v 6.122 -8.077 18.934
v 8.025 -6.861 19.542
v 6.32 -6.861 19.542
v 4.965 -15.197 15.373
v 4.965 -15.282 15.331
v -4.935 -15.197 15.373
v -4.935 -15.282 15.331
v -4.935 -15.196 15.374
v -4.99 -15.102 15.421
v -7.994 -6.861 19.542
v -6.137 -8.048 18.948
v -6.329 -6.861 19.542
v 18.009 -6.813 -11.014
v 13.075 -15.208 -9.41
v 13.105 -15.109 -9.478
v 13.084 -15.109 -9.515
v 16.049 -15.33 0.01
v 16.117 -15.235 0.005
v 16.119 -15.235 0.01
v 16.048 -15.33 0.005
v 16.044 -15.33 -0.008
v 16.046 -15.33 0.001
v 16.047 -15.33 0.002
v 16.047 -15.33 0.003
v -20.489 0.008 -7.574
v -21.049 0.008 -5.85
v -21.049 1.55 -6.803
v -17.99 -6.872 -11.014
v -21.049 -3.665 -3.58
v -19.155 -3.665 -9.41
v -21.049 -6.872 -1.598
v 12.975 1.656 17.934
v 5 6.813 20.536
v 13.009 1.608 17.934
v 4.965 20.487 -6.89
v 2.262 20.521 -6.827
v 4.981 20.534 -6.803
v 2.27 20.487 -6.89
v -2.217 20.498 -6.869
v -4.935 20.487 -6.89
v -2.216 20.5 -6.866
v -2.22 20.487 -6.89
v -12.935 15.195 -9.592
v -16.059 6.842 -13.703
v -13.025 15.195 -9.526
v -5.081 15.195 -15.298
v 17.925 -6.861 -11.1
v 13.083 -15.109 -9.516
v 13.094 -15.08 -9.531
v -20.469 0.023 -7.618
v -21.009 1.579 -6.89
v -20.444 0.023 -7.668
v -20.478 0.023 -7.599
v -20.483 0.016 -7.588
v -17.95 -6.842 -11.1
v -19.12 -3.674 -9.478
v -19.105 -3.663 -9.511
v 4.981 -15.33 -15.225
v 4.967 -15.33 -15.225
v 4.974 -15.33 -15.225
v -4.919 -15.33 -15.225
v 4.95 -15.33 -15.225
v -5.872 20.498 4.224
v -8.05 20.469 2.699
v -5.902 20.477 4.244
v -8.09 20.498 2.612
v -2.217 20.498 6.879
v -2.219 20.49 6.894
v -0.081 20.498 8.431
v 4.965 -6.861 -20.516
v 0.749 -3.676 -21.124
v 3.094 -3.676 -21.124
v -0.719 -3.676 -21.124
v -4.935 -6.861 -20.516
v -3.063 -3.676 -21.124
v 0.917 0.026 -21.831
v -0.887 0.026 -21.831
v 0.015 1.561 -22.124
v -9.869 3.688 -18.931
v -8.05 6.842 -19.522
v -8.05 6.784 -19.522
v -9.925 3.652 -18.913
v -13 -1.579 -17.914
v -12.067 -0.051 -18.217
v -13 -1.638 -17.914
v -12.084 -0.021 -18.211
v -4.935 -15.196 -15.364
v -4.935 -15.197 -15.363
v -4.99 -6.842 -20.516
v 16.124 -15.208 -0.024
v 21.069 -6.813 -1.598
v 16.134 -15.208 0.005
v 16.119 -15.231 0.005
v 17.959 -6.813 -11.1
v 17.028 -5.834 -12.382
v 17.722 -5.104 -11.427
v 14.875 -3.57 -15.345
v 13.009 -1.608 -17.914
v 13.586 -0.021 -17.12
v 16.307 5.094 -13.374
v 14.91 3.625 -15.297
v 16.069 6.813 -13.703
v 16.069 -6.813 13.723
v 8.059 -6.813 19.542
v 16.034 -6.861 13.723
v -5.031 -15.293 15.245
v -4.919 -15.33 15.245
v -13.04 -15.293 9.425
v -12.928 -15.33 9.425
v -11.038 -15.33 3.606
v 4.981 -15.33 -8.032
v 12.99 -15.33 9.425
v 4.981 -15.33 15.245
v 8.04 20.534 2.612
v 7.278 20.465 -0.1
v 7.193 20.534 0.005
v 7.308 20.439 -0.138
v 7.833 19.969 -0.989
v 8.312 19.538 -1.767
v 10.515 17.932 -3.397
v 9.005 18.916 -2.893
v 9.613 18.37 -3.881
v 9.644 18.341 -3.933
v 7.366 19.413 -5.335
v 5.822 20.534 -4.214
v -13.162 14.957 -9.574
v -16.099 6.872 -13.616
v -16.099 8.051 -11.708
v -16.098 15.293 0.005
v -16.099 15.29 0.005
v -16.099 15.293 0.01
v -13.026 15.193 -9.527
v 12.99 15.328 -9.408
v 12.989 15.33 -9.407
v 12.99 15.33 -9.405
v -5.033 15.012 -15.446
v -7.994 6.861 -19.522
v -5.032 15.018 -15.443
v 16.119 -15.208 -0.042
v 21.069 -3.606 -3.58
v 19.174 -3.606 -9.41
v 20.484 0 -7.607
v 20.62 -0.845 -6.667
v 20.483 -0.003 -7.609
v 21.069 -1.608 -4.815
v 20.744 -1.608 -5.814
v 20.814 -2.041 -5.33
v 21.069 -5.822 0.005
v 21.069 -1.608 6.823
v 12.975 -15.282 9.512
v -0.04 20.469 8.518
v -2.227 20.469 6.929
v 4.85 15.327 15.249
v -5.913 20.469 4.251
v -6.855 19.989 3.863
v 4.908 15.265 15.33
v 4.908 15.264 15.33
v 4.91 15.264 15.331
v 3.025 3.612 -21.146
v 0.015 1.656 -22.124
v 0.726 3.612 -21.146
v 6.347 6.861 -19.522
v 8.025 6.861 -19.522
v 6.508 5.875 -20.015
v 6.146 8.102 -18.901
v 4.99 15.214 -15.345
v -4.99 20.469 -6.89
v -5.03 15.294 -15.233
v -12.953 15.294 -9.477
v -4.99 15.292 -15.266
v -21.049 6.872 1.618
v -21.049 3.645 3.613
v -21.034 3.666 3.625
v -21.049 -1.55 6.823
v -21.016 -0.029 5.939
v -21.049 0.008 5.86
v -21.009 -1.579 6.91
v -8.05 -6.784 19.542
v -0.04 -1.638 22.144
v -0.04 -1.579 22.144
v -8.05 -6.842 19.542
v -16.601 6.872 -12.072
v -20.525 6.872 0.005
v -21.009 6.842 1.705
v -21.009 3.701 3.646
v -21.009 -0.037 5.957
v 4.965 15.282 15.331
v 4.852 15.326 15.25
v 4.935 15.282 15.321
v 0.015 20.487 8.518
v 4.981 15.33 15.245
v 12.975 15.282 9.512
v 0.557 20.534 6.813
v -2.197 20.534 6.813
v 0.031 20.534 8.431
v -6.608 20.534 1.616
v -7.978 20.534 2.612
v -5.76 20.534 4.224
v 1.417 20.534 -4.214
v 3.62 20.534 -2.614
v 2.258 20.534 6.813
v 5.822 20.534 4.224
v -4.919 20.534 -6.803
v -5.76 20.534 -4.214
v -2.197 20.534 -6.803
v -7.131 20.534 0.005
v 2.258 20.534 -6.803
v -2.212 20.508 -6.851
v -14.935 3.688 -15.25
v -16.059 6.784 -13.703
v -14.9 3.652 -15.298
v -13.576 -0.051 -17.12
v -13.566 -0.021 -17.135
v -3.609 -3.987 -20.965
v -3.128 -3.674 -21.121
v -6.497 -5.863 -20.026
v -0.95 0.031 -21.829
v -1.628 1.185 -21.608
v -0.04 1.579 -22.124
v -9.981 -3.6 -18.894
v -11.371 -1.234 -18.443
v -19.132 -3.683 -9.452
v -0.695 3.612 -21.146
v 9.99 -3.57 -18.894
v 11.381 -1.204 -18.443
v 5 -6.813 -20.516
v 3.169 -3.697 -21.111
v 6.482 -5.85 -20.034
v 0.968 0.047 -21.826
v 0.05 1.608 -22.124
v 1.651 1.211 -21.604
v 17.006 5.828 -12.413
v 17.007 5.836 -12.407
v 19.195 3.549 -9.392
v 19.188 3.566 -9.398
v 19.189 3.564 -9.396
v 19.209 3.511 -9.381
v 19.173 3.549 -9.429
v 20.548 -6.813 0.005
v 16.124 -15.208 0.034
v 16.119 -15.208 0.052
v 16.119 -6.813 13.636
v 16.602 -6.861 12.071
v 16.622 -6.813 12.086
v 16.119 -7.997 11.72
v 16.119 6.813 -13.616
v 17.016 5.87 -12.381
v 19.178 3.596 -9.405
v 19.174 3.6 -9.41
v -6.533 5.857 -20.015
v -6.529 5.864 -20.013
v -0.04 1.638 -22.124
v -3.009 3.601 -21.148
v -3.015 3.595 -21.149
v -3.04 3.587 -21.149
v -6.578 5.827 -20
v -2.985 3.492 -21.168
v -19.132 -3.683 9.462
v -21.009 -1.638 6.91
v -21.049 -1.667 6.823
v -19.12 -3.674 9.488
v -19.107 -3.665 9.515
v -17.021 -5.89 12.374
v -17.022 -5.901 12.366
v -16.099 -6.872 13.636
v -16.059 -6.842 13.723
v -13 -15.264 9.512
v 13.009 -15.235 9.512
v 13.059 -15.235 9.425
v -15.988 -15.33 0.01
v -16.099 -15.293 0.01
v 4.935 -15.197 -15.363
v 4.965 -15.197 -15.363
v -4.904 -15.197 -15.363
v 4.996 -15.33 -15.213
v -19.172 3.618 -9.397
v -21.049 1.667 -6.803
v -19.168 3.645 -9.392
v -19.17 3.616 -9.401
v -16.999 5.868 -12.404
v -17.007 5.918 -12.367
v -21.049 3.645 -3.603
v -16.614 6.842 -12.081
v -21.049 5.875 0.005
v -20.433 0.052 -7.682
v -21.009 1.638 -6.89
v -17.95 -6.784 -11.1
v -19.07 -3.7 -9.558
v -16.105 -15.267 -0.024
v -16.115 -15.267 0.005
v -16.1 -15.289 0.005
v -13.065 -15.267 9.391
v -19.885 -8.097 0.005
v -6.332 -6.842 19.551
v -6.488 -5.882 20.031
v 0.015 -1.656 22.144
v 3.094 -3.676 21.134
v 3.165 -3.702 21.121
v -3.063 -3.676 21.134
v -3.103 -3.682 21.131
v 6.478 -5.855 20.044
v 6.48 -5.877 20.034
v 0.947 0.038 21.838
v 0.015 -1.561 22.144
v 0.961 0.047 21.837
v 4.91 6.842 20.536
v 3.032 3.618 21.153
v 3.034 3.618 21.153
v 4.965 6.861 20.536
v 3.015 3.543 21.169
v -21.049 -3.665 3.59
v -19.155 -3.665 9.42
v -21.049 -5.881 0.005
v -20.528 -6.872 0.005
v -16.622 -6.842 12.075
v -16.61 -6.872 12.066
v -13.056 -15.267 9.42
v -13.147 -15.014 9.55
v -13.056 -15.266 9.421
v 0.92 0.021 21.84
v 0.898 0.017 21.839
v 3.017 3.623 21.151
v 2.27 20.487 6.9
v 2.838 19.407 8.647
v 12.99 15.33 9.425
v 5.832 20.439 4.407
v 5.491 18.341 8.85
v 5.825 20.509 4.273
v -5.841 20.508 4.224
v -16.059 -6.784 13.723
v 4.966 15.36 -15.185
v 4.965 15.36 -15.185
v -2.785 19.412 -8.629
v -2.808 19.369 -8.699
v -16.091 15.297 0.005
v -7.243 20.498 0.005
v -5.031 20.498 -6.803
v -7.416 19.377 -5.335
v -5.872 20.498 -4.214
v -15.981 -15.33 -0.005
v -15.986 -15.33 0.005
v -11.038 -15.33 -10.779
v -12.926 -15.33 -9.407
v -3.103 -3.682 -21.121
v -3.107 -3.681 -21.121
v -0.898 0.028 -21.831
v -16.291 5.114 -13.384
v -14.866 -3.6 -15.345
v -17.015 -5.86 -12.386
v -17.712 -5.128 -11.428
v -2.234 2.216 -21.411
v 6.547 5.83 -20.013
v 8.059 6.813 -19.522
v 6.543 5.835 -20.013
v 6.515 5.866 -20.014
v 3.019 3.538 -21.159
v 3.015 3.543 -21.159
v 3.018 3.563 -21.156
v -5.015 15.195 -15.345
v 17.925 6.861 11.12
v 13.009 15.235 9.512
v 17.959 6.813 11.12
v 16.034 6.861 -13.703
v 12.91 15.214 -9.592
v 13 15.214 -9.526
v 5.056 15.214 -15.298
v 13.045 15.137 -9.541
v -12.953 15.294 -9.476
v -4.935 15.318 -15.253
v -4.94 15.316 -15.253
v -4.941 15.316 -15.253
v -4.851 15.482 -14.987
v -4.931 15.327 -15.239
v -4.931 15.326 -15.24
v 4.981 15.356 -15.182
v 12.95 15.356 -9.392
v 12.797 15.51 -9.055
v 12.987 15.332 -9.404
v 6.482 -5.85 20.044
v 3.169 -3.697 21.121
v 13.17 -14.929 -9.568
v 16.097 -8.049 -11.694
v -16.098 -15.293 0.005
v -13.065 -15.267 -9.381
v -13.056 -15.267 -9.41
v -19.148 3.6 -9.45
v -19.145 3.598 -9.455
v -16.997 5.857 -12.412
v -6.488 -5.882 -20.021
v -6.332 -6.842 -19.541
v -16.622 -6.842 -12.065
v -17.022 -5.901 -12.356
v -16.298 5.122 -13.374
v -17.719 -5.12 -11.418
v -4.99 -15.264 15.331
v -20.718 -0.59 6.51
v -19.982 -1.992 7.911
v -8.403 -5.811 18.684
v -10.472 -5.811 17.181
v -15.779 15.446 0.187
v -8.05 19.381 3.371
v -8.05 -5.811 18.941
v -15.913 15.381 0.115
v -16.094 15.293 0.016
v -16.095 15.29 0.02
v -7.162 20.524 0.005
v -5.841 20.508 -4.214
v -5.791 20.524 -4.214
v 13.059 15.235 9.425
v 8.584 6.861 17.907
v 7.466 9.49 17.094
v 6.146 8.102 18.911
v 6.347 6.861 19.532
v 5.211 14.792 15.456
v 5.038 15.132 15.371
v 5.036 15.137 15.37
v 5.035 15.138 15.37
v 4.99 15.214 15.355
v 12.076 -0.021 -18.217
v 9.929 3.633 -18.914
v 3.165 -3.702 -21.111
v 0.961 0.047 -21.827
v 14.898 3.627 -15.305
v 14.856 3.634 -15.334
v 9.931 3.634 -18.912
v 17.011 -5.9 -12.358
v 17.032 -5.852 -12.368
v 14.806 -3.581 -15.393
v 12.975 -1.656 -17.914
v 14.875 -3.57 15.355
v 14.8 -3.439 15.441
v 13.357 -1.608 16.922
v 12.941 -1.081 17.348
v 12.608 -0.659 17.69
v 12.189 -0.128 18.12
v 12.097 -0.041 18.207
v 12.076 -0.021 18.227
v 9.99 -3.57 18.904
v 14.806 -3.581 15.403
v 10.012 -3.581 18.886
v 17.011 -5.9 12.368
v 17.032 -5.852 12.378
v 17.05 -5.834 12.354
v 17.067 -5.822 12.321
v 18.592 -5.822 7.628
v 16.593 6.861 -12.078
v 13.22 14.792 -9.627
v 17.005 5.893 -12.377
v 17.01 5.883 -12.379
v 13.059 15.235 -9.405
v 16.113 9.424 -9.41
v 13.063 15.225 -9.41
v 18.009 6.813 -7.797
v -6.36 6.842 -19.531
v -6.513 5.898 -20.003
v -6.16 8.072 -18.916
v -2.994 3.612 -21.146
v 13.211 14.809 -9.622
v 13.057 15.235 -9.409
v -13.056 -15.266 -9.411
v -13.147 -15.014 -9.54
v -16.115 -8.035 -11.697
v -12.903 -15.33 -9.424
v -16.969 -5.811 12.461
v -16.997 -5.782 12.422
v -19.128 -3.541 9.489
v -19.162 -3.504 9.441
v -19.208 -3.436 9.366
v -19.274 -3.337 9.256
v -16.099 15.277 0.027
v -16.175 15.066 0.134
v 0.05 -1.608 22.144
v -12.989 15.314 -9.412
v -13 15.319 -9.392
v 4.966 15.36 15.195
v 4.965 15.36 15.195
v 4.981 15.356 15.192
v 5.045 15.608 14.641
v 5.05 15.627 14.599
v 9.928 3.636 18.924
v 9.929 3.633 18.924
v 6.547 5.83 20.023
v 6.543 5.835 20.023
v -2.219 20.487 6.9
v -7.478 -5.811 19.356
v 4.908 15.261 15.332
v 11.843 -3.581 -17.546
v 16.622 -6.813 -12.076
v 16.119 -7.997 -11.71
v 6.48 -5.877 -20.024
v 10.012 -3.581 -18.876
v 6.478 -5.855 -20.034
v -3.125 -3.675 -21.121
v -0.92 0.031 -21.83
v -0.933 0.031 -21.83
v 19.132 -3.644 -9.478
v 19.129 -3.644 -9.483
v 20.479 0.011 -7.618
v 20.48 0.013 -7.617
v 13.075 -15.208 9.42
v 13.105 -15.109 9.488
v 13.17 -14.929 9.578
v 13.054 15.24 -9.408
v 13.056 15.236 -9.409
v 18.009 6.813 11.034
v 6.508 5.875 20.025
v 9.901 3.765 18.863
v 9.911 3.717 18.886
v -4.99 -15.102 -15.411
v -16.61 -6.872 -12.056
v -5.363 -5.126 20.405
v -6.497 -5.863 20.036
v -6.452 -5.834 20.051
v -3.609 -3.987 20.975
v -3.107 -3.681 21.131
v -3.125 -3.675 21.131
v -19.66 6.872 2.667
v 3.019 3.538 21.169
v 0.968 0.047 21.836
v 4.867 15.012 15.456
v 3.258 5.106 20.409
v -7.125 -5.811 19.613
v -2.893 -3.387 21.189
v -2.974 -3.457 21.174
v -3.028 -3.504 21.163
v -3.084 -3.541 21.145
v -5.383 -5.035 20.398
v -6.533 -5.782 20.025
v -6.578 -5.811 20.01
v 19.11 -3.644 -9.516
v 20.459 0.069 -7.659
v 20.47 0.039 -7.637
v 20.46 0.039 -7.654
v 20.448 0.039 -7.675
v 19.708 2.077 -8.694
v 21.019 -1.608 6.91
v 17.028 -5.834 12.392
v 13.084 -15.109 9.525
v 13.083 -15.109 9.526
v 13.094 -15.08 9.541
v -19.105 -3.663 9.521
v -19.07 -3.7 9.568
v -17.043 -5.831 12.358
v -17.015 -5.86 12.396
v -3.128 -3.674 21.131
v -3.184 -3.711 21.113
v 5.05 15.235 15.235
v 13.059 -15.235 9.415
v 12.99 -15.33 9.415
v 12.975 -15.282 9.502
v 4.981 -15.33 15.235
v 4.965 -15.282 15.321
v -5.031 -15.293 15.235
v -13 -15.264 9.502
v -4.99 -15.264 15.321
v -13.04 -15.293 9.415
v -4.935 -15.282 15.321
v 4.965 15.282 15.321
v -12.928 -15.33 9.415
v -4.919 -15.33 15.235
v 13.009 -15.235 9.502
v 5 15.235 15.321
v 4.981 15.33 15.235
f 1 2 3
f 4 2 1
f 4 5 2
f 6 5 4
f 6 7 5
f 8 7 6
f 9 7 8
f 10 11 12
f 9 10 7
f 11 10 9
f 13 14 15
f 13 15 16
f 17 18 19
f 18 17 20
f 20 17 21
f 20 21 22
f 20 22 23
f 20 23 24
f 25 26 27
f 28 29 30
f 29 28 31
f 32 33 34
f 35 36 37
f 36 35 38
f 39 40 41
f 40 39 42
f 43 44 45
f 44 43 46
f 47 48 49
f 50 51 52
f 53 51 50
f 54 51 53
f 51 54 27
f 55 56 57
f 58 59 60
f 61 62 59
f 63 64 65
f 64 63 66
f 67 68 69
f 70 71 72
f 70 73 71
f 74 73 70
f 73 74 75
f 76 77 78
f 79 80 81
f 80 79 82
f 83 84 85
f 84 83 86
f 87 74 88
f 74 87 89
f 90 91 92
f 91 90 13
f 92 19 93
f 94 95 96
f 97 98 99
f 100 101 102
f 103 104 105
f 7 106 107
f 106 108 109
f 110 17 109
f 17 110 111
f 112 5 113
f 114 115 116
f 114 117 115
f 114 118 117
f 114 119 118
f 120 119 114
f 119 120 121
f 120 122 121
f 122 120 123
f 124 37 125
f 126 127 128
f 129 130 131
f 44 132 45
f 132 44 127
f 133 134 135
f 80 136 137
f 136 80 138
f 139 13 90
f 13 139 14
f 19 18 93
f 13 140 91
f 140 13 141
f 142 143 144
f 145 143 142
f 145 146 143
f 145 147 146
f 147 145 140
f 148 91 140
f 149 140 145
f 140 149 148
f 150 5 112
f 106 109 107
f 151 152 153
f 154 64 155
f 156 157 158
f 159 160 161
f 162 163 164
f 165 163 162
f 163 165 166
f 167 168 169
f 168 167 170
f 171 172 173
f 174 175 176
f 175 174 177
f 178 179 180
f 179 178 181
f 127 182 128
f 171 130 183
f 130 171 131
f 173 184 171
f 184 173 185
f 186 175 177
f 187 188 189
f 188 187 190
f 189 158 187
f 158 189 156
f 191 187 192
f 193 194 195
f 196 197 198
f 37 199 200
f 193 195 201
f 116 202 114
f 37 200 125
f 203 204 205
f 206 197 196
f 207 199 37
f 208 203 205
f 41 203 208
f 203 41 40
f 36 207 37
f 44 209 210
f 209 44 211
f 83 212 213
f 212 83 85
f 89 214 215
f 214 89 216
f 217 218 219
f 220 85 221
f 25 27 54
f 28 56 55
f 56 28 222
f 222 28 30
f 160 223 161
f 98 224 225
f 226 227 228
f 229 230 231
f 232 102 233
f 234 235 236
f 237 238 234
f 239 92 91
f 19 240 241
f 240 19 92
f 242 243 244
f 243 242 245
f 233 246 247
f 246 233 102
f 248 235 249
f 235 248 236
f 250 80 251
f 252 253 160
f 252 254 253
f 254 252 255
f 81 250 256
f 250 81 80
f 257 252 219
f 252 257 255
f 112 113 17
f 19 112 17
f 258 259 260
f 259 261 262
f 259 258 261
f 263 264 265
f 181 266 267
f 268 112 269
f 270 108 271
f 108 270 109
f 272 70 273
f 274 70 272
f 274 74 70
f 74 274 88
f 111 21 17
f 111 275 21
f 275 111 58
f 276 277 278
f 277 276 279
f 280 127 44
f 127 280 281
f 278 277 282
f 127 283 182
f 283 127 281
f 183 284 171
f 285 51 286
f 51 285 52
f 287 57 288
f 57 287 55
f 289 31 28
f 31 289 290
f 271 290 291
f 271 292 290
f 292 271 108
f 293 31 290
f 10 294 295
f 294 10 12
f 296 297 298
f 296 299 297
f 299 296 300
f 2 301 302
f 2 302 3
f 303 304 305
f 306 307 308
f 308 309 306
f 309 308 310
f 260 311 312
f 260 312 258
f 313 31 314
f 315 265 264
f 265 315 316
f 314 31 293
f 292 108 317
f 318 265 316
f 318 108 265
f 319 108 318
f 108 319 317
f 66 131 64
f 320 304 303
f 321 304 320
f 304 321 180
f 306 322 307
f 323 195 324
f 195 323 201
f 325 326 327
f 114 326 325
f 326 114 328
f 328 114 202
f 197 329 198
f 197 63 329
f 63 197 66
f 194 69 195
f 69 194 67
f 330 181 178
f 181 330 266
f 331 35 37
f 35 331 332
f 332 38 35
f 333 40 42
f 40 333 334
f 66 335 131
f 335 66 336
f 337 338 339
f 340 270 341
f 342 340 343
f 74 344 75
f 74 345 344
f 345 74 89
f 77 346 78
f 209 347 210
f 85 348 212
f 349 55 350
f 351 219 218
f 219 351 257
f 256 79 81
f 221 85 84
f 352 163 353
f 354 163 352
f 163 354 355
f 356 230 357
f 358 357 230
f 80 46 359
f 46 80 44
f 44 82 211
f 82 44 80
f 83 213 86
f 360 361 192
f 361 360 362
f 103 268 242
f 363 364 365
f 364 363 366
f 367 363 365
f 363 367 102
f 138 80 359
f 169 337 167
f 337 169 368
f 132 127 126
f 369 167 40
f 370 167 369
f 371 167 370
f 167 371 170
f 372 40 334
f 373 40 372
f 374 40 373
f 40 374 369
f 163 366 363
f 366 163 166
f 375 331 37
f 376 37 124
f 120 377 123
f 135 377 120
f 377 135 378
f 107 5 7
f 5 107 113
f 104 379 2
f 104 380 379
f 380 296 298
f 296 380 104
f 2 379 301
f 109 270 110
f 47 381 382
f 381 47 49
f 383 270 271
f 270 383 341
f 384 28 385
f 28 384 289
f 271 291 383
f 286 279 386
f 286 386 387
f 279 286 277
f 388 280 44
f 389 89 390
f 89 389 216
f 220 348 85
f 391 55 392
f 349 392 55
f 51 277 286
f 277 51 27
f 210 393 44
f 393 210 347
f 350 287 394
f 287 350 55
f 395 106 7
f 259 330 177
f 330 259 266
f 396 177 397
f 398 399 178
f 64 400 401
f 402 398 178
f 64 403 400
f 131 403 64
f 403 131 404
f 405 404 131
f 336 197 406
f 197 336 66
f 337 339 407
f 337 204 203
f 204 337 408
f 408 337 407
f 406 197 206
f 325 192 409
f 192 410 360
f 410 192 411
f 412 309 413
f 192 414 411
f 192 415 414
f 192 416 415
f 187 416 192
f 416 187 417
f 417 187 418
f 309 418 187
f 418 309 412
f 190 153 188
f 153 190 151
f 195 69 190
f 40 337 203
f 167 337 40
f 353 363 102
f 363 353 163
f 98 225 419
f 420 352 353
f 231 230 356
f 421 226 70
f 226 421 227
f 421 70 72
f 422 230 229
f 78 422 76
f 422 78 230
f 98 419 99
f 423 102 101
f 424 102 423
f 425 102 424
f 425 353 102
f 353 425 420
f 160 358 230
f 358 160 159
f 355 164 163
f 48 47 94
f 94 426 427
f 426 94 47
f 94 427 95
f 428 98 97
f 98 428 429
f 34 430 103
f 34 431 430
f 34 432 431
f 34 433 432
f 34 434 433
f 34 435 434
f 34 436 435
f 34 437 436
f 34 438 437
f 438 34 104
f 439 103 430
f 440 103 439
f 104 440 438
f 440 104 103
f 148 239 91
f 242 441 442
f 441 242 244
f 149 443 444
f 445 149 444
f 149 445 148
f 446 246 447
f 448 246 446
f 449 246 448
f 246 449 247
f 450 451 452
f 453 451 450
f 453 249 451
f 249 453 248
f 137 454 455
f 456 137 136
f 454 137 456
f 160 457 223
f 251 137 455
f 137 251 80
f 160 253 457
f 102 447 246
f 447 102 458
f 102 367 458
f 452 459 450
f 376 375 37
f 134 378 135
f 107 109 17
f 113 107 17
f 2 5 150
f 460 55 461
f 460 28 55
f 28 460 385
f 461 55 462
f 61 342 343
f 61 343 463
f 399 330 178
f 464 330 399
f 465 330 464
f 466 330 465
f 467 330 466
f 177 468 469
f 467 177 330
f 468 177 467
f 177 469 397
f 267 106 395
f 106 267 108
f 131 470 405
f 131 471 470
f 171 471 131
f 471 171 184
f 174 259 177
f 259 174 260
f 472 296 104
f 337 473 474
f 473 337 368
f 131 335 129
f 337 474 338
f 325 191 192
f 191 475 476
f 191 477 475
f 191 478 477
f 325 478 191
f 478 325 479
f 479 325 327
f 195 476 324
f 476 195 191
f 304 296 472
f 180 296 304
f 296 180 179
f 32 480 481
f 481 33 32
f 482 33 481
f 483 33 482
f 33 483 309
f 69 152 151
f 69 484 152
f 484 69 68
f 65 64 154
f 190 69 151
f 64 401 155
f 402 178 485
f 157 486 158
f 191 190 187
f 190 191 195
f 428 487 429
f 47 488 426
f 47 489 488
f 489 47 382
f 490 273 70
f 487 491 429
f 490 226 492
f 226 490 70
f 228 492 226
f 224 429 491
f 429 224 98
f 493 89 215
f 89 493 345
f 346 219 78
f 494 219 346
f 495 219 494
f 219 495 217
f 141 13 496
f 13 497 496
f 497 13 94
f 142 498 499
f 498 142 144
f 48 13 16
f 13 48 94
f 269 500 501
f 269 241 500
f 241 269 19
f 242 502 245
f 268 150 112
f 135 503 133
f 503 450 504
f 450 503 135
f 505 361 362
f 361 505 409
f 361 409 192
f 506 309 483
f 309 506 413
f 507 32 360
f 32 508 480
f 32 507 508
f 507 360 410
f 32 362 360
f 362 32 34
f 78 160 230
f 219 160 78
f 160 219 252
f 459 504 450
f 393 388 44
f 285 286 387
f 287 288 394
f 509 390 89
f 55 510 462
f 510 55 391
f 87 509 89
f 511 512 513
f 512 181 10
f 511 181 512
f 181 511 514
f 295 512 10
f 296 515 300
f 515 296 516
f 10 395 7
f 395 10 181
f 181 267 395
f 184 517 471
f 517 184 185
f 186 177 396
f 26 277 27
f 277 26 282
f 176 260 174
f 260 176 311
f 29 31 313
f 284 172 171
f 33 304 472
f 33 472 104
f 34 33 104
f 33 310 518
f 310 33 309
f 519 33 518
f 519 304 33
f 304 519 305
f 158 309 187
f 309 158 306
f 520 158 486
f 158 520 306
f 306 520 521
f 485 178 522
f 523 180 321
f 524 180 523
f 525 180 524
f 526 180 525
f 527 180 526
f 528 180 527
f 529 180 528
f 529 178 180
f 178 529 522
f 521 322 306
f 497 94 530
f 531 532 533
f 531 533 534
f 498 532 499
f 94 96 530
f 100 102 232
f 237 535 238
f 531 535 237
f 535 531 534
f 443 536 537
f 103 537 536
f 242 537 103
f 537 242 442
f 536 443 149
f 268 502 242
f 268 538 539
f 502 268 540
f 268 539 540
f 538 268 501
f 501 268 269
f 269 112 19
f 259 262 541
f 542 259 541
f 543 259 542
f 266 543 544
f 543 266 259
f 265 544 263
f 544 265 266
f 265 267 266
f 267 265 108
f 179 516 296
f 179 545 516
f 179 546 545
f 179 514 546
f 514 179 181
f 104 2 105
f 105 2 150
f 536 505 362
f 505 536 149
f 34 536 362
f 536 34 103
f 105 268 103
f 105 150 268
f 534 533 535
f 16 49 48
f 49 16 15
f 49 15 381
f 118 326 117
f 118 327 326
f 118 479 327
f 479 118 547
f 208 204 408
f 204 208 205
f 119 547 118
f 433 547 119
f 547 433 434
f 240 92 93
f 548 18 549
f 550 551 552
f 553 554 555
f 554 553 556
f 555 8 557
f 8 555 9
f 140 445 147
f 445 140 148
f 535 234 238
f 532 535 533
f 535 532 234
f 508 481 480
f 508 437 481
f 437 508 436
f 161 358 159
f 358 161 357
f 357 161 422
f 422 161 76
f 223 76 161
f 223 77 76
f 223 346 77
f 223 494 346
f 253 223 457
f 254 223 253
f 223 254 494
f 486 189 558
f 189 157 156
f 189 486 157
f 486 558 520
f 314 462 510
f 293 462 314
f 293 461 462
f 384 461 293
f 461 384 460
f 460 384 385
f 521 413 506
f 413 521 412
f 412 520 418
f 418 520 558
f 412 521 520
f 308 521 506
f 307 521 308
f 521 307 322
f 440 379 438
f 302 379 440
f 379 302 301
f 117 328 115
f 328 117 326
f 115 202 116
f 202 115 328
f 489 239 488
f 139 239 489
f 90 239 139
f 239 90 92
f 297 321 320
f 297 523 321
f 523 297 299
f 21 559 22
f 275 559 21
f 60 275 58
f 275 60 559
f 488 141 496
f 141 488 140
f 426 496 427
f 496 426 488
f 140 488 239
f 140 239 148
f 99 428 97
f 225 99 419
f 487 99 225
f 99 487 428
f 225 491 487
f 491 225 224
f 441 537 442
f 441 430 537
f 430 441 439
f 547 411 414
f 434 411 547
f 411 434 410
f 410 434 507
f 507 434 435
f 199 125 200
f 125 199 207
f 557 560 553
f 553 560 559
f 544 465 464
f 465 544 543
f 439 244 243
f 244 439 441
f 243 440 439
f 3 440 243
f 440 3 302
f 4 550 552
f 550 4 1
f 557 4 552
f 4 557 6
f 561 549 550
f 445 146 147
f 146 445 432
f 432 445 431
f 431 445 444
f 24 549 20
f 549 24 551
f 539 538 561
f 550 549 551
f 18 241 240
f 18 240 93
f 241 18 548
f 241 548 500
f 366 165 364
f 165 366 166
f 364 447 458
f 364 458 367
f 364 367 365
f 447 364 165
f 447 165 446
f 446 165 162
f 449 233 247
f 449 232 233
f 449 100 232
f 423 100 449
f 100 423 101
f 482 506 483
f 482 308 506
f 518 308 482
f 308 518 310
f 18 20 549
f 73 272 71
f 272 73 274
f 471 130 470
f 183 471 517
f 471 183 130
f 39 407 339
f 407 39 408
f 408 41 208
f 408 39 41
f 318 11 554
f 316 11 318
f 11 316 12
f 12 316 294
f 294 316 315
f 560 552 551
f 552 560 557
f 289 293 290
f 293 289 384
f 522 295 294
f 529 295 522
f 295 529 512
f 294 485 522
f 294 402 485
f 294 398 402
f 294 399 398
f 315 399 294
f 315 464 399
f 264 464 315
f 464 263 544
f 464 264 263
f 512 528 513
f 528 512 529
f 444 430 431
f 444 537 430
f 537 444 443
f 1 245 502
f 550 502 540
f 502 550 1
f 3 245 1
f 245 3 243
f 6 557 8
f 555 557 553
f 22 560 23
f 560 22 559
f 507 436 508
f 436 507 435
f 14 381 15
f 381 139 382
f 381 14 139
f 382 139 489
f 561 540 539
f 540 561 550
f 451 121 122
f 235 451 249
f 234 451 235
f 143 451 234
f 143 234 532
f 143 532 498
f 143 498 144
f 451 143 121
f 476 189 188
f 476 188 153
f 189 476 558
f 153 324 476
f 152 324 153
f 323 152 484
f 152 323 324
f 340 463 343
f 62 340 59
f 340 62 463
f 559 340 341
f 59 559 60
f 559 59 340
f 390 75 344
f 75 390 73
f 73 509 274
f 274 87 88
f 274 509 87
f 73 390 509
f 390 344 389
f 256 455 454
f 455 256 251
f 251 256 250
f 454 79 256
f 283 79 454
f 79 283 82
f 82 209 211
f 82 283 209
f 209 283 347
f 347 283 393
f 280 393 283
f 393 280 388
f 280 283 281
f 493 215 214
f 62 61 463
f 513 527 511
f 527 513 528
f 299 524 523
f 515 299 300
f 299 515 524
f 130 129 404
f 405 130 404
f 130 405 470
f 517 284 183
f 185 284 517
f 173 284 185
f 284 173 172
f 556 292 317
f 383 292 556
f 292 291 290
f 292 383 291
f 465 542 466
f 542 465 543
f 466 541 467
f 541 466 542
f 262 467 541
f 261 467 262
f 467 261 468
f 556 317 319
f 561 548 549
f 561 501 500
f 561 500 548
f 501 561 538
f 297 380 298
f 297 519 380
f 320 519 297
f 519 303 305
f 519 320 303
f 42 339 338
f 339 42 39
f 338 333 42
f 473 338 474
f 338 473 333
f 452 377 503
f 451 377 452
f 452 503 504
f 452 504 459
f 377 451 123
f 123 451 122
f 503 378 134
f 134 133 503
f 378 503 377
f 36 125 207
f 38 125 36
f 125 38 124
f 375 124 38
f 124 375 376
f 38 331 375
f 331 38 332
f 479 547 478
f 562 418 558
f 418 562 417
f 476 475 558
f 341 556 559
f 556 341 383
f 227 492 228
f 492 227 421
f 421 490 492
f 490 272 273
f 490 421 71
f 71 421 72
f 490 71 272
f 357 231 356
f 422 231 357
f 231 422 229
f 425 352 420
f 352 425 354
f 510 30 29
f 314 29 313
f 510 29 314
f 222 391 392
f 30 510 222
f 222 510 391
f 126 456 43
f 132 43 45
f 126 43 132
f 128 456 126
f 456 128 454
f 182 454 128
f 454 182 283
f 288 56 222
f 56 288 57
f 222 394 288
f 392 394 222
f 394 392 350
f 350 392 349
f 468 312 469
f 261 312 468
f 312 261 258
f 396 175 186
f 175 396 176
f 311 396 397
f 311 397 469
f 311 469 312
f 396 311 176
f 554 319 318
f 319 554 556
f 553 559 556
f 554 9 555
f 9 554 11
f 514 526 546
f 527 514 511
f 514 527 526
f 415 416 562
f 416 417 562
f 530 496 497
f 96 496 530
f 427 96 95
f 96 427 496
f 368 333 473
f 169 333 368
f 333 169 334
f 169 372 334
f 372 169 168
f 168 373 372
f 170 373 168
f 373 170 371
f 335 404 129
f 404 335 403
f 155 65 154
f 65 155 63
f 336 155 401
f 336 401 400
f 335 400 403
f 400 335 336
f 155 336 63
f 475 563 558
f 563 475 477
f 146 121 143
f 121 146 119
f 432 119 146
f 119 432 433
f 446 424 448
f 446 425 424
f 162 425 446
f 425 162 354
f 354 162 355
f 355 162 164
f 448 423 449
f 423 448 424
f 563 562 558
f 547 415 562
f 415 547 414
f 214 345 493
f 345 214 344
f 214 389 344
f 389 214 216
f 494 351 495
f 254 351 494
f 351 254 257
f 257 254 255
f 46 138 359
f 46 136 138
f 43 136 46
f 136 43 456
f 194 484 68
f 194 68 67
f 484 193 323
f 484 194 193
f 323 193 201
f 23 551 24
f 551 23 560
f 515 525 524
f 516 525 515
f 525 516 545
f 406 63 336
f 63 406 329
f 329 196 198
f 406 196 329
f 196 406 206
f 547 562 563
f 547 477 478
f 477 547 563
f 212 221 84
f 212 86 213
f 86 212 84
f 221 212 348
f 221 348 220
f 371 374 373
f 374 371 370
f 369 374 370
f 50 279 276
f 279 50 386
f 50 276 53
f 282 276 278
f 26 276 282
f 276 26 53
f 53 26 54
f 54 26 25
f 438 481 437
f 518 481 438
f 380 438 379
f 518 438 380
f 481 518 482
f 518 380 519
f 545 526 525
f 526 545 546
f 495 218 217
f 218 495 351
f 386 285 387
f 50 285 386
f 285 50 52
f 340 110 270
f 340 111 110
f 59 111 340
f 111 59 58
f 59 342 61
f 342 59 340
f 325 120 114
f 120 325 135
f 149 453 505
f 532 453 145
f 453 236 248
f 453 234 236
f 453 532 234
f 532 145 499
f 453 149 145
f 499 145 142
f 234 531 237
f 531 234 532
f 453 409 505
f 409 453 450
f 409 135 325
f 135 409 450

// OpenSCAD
// Auto-generated OpenSCAD file

    shift = 0.01;

    inner_points = 9.9*[[1.30901696039044, -1.5388417782265715, 0.9510565474746461], [-2.1180339733846583, 0.6881910044632044, -0.16245986108672694], [1.8090169796137625, -0.6881909777335578, 1.1135163775781873], [-1.6180339541613356, 1.5388418049562185, -3.0983185683730596e-08], [1.6180339541612156, -1.538841804956286, 3.0983185683730596e-08], [-1.8090169796138824, 0.68819097773349, -1.1135163775781873], [2.1180339733845384, -0.6881910044632721, 0.16245986108672694], [-1.30901696039056, 1.538841778226504, -0.9510565474746461], [-0.5000000141570125, -0.6881909060497494, 2.064572895340174], [-1.3090169968820657, -0.16245978121444532, 1.801707328858261], [5.066310430925828e-09, 0.1624598944432645, 2.227032725443715], [-0.8090169776587427, 0.6881910192785686, 1.9641671589618024], [0.809016977658623, -0.6881910192786364, -1.9641671589618024], [-5.066430170716978e-09, -0.16245989444333217, -2.227032725443715], [1.3090169968819458, 0.16245978121437765, -1.801707328858261], [0.5000000141568928, 0.6881909060496817, -2.064572895340174], [-1.618034023338573, -1.5388417322190338, 3.303893986172923e-08], [0.5000000468426242, 2.0645728837839843, 0.6881909169706076], [-1.3090170295677974, -1.538841758948748, -0.9510564834525206], [0.8090170406134, 2.06457285705427, -0.26286559952085276], [-2.118033992838755, -0.16245981482511987, -0.6881909555105802], [-0.8090169481364942, 2.064572893422896, -0.26286559849297564], [0.49999998584298705, -0.6881909285267964, 2.0645728947049107], [-1.6180339724070885, 0.6881910252357436, 1.376381907183268], [1.6180339724069686, -0.6881910252358113, -1.376381907183268], [-0.49999998584310684, 0.6881909285267287, -2.0645728947049107], [-1.3090170283594544, -1.5388417193808985, 0.9510565491377863], [0.5000000355661287, 1.5388417893601316, 1.5388417362589322], [-0.5000000355662484, -1.538841789360199, -1.5388417362589322], [1.3090170283593345, 1.538841719380831, -0.9510565491377863], [0.4999999663888912, -1.5388417478151206, 1.5388418002810578], [-2.118033984661154, 0.16245991003935126, 0.6881909582015976], [1.3090169918678283, -0.16245984006011832, 1.8017073271951207], [-1.309016959182217, 1.5388418177943537, 0.9510564851156607], [1.309016959182097, -1.5388418177944212, -0.9510564851156607], [-1.3090169918679482, 0.16245984006005065, -1.8017073271951207], [2.118033984661034, -0.16245991003941893, -0.6881909582015976], [-0.499999966389011, 1.5388417478150531, -1.5388418002810578], [-0.5000000336111086, -1.5388417253380735, 1.5388418009163205], [-1.8090170091361313, -0.6881908964108379, 1.1135163798765904], [0.8090170110911518, 0.6881909829099426, 1.9641671579339253], [-0.49999996443387096, 1.5388418118371785, 1.5388417368941951], [0.49999996443375117, -1.538841811837246, -1.5388417368941951], [-0.8090170110912714, -0.6881909829100104, -1.9641671579339253], [1.8090170091360114, 0.6881908964107701, -1.1135163798765904], [0.5000000336109889, 1.538841725338006, -1.5388418009163205], [-2.1180340041152497, -0.688190909248973, 0.16245986377774424], [-0.49999995315737555, 2.064572906261031, 0.6881909176058706], [-1.6180340050928197, -0.6881909524985592, -1.3763819051275137], [4.586505433710224e-08, 2.064572863011445, -0.8506508512993872]];

    outer_points_unshifted = 9.9*[[-0.8090170110916863, -0.6881908812857832, 1.9641671935400922], [1.3090170295679837, 1.538841709741917, -0.95105656307045], [-0.5000000355665741, -1.538841709741917, 1.5388418158770538], [1.6180340050930957, 0.6881908812857832, -1.3763819407334883], [-1.6180340050930957, -0.6881908812857832, 1.3763819407334883], [0.5000000355665741, 1.538841709741917, -1.5388418158770538], [-1.3090170295679837, -1.538841709741917, 0.95105656307045], [0.8090170110916863, 0.6881908812857832, -1.9641671935400922], [1.3090169968815815, 0.1624598744330541, 1.8017073204530507], [1.809017009135817, 0.6881909540230795, 1.113516344270661], [1.6180339724066932, -0.6881909540230795, 1.3763819427900126], [2.118033984660929, -0.1624598744330541, 0.6881909666076228], [-2.118033984660929, 0.1624598744330541, -0.6881909666076228], [-1.6180339724066932, 0.6881909540230795, -1.3763819427900126], [-1.809017009135817, -0.6881909540230795, -1.113516344270661], [-1.3090169968815815, -0.1624598744330541, -1.8017073204530507], [4.5864941067286225e-08, 2.06457290702336, 0.8506507444803071], [1.309016960390704, -1.5388418274333344, -0.9510564678560931], [-0.8090169481364684, 2.06457290702336, 0.26286549167370316], [0.4999999663892946, -1.5388418274333344, -1.538841720662697], [0.5000000468428755, 2.064572848177651, -0.6881910237895683], [1.3090169918683128, -0.16245993327876307, -1.8017073187892874], [0.8090169776582082, -0.6881909176544313, 1.9641671945683543], [2.118034004115161, 0.6881909176544313, 0.1624598281718883], [-2.118034004115161, -0.6881909176544313, -0.1624598281718883], [-0.8090169776582082, 0.6881909176544313, -1.9641671945683543], [0.5000000336107052, 1.5388418049562738, 1.538841721298198], [1.6180339541612545, -1.5388418049562738, 4.863544078581583e-08], [-1.6180339541612545, 1.5388418049562738, -4.863544078581583e-08], [-0.5000000336107052, -1.5388418049562738, -1.538841721298198], [-5.066900010675113e-09, -0.16245977921869703, 2.227032733849236], [1.6180340233385344, 1.5388417322189776, -4.657891639059386e-08], [0.4999999644334254, -1.5388417322189776, 1.538841816512555], [2.1180339928388596, 0.16245977921869703, -0.6881909639155974], [-2.1180339928388596, -0.16245977921869703, 0.6881909639155974], [-0.4999999644334254, 1.5388417322189776, -1.538841816512555], [-1.6180340233385344, -1.5388417322189776, 4.657891639059386e-08], [5.066900010675113e-09, 0.16245977921869703, -2.227032733849236], [0.5000000141564732, 0.6881910128687885, 2.0645728597339326], [1.3090170283591904, 1.5388417685876257, 0.9510564695198562], [1.3090169591819105, -1.5388417685876257, 0.9510565647342133], [2.1180339733846276, -0.6881910128687885, -0.16245982547986293], [-2.1180339733846276, 0.6881910128687885, 0.16245982547986293], [-1.3090169591819105, 1.5388417685876257, -0.9510565647342133], [-1.3090170283591904, -1.5388417685876257, -0.9510564695198562], [-0.5000000141564732, -0.6881910128687885, -2.0645728597339326], [0.8090170406134262, 2.064572870654712, 0.26286549270196535], [1.8090169796140771, -0.6881910353458492, -1.1135163419713967], [-0.4999999531571243, 2.064572870654712, -0.6881910244250694], [0.4999999858435267, -0.6881910353458492, -2.0645728590984316]];

    outer_points = [for (p = outer_points_unshifted) [p[0], p[1], p[2] + shift]];
    // Convex hull for inner set (I)
    module inner_hull() {
        hull() {
            for (p = inner_points) {
                translate(p) sphere(r=0.1);
            }
        }
    }

    // Convex hull for outer set (O) minus inner hull (O \ I)
    module outer_minus_inner() {
        difference() {
            hull() {
                for (p = outer_points) {
                    translate(p) sphere(r=0.1);
                }
            }
            inner_hull(); // Subtract inner hull
        }
    }

    // Convex hull for outer set (O) minus all translated inner hulls
    module outer_minus_AllTranslationInner() {
        difference() {
            hull() {
                for (p = outer_points) {
                    translate(p) sphere(r=0.1);
                }
            }
            hull() {
                translate([0,0,50]) inner_hull();
                translate([0,0,-50]) inner_hull();
            }; // Subtract translated inner hulls
        }
    }

    // Difference between outer_minus_inner and outer_minus_AllTranslationInner
    module outer_minus_inner_diff() {
        difference() {
            // Outer minus inner
            difference() {
                hull() {
                    for (p = outer_points) {
                        translate(p) sphere(r=0.1);
                    }
                }
                inner_hull();
            }

            // Subtract Outer minus AllTranslationInner
            difference() {
                hull() {
                    for (p = outer_points) {
                        translate(p) sphere(r=0.1);
                    }
                }
                hull() {
                    translate([0,0,50]) inner_hull();
                    translate([0,0,-50]) inner_hull();
                };
            }
        }
    }

    // Rendering all with colors applied
    // color([1, 0, 0, 0.5]) inner_hull(); // Transparent red
    // color([0, 1, 0, 1]) outer_minus_AllTranslationInner(); // Opaque green
    color([1, 1, 0, 1]) outer_minus_inner_diff(); // Opaque yellow
    
